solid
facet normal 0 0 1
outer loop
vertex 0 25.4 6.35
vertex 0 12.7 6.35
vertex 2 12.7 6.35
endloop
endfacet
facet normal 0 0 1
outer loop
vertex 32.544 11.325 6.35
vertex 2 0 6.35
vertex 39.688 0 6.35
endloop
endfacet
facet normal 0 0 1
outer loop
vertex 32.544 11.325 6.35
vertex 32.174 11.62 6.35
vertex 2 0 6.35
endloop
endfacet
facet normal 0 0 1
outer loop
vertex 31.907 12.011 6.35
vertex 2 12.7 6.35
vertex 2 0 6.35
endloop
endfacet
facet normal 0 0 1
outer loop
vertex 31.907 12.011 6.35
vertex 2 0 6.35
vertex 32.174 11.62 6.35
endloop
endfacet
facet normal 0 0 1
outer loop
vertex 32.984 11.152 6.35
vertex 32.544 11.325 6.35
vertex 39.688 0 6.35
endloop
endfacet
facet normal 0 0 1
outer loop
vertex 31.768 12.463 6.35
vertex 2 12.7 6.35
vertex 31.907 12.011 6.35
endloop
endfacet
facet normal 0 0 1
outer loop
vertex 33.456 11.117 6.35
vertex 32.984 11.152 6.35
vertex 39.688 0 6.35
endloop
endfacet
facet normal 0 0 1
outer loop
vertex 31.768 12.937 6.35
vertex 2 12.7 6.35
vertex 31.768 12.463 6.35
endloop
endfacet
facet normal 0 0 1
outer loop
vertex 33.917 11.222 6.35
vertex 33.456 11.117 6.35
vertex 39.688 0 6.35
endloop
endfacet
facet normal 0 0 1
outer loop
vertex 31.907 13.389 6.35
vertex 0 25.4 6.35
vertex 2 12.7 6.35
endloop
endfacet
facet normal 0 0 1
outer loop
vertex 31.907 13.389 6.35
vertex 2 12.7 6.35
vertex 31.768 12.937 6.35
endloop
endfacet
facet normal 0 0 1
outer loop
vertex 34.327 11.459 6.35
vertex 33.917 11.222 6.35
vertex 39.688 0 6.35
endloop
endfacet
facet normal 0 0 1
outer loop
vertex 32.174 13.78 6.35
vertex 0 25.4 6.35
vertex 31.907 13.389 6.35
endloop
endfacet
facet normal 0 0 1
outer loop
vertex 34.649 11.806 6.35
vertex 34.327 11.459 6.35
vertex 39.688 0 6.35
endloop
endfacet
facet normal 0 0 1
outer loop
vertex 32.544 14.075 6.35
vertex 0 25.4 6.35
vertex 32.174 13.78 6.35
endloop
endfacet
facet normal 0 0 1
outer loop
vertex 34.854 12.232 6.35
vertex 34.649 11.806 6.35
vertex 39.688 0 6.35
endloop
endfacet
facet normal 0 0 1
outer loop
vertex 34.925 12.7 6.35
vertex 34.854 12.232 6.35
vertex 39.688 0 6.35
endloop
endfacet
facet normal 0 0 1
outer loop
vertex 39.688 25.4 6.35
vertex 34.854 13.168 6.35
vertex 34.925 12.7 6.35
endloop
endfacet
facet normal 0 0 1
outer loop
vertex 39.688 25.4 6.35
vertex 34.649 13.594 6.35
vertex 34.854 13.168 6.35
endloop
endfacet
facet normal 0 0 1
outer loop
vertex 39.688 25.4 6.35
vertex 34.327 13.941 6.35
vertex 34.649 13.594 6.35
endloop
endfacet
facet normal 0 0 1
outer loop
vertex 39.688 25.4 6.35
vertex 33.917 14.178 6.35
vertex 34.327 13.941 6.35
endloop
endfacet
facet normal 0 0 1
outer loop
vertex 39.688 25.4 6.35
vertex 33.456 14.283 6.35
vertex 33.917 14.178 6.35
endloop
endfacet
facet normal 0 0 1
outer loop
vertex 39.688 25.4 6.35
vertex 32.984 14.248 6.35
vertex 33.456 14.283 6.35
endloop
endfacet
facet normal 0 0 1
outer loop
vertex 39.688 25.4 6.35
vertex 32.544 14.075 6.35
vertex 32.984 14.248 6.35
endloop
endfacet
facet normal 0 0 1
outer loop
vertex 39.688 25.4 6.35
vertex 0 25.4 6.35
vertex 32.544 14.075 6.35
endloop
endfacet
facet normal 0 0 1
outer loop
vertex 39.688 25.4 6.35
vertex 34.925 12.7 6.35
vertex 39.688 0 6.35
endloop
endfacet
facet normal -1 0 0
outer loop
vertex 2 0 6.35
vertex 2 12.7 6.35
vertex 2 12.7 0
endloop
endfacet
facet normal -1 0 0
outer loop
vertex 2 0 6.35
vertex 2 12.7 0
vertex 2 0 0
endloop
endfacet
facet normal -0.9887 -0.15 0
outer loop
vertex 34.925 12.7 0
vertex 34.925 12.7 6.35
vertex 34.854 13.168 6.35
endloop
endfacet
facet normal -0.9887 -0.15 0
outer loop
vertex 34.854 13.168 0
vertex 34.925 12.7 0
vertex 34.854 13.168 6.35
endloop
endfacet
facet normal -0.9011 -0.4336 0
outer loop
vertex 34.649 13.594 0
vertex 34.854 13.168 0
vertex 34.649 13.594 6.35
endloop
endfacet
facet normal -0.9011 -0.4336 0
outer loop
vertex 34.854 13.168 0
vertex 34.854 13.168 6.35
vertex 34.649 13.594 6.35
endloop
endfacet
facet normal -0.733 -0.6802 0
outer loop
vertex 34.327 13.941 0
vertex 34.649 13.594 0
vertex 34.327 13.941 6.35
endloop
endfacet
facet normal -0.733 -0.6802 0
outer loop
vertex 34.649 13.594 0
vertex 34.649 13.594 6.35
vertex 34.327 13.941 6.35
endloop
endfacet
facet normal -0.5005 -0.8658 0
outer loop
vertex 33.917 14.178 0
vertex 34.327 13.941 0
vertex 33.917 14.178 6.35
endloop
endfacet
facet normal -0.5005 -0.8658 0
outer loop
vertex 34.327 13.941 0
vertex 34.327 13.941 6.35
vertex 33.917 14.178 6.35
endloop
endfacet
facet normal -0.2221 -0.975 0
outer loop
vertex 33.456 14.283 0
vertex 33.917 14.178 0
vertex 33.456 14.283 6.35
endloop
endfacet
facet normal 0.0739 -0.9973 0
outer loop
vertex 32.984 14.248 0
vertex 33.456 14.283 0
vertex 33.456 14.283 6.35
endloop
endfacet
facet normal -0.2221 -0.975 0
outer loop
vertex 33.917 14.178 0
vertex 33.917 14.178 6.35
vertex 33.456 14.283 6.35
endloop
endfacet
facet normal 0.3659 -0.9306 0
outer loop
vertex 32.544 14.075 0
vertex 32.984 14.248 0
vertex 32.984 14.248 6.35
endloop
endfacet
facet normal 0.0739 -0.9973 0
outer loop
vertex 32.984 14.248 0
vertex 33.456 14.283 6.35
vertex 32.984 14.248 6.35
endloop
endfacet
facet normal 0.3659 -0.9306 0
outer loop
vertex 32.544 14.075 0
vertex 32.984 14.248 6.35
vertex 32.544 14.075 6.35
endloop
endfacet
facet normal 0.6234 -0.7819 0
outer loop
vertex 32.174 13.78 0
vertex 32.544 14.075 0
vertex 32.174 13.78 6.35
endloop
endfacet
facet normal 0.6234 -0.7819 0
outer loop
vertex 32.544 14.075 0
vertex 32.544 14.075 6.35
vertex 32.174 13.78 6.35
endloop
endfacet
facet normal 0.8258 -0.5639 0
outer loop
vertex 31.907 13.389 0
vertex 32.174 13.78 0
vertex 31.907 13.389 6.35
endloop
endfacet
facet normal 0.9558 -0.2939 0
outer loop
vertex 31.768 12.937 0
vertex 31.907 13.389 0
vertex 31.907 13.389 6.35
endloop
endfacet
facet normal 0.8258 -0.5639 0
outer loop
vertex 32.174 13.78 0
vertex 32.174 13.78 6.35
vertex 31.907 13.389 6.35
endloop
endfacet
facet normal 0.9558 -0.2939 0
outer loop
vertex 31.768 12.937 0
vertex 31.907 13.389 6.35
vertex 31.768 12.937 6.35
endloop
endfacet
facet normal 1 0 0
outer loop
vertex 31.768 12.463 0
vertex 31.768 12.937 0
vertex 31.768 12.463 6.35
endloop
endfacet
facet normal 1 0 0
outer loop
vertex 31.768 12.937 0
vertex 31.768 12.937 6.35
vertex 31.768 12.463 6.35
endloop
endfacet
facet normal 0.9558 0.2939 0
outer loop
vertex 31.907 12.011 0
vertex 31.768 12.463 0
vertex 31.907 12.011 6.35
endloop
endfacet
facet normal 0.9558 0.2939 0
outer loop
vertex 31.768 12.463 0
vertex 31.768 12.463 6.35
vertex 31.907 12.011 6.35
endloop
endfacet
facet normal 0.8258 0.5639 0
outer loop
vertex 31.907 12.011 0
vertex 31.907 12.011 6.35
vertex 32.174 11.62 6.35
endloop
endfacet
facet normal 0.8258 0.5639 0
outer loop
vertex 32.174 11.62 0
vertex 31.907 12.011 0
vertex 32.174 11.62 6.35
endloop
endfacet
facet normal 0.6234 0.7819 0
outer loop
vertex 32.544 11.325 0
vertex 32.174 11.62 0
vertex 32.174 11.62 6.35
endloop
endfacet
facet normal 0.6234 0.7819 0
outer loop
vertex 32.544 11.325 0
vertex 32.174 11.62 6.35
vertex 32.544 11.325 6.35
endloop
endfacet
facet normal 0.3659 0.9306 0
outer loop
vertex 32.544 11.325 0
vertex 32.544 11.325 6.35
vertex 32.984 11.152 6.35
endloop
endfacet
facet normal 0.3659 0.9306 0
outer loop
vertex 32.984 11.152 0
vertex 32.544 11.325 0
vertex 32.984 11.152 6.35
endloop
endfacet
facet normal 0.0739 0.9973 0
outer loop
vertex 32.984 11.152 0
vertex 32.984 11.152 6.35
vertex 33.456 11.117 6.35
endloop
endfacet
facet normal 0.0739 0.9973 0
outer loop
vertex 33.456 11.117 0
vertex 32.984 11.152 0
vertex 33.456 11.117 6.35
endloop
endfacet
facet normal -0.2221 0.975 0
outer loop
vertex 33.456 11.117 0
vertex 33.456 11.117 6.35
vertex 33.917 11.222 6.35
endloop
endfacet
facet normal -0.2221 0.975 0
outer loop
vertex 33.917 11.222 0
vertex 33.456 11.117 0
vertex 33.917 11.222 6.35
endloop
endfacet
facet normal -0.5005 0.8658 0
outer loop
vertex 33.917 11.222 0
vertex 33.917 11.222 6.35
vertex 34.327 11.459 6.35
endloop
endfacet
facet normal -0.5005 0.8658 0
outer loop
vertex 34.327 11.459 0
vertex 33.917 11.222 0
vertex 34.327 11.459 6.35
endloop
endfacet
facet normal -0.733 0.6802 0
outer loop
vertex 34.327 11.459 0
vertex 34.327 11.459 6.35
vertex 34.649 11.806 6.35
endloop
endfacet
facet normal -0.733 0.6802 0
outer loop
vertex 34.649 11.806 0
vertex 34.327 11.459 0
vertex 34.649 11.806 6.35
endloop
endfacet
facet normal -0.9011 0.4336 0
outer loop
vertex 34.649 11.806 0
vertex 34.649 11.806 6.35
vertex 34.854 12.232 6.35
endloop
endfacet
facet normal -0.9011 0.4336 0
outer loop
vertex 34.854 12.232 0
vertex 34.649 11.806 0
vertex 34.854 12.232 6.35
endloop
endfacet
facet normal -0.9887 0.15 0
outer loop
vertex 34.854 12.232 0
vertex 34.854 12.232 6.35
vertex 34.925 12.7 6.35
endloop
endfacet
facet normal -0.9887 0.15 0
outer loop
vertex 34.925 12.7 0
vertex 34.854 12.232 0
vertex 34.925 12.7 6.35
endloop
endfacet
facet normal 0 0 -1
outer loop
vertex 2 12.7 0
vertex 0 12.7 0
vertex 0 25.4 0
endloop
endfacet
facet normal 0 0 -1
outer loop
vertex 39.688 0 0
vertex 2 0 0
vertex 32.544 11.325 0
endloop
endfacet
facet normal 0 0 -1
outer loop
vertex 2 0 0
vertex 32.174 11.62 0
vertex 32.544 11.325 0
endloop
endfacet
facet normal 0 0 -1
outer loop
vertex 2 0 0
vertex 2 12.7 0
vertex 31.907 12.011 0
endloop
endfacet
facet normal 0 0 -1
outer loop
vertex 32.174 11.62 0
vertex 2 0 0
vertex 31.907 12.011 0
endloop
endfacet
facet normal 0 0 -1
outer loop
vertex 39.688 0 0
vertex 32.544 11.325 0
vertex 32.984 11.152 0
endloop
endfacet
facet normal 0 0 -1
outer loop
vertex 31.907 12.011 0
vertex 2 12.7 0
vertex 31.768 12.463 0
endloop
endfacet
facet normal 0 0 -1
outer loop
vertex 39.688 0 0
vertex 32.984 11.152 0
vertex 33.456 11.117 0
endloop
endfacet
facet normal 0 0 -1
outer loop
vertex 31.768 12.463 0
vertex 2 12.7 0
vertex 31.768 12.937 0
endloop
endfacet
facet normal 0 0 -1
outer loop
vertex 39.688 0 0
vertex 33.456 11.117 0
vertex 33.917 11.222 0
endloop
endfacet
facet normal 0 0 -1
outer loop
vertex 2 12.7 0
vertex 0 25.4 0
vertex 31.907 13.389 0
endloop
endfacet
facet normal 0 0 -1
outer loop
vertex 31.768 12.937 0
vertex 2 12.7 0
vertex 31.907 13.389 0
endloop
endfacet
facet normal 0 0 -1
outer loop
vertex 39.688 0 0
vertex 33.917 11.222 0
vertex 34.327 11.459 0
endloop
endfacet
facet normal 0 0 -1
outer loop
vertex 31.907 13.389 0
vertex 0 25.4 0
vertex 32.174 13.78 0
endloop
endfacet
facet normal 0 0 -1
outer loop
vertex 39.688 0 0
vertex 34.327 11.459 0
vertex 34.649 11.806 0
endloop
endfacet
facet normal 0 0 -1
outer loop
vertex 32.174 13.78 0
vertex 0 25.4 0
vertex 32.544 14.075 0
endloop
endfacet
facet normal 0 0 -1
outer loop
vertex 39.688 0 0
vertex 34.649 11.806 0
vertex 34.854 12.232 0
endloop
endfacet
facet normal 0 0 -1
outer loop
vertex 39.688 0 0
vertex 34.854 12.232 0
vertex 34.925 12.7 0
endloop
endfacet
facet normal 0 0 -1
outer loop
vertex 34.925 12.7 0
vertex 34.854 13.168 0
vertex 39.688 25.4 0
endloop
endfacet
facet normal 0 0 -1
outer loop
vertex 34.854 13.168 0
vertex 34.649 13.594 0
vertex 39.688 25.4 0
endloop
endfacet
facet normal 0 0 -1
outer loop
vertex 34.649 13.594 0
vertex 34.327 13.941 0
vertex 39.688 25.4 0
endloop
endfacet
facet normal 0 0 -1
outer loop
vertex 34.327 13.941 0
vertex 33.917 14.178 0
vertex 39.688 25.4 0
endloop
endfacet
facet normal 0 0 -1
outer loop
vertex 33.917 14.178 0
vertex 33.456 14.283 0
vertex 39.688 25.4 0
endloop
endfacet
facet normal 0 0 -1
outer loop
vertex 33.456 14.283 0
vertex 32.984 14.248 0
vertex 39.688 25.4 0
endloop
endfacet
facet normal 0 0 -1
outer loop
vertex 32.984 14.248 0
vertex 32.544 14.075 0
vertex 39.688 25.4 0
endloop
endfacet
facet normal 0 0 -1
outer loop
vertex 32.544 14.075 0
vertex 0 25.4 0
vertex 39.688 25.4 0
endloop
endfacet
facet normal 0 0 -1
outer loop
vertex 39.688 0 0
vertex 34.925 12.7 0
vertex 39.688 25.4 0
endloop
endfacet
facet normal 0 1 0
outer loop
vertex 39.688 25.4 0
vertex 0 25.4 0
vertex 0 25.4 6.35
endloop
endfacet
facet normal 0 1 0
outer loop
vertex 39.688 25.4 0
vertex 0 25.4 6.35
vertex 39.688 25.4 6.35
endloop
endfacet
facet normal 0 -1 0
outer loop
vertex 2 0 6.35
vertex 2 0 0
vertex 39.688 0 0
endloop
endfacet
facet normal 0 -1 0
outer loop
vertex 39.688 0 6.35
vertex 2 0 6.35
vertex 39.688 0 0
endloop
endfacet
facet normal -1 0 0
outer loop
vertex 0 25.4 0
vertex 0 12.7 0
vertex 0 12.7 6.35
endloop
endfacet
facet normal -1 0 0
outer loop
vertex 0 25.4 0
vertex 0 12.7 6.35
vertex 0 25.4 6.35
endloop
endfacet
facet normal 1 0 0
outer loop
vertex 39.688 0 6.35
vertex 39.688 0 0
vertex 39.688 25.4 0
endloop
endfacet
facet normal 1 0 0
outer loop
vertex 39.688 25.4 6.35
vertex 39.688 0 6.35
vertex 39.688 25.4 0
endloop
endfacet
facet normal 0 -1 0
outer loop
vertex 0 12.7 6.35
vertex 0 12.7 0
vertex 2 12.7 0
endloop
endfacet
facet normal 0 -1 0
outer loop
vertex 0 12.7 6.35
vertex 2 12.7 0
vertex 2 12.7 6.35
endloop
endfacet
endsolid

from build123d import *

# Parameters (mm, degrees)
F0_W     = 39.6875
F0_H     = 25.4
F1_DEPTH = 6.35
F2_W     = 12.7
F2_H     = 6.35
F3_DEPTH = 2
F4_R     = 1.5875
F5_DEPTH = 25.4


with BuildPart() as f1:
    # F0 (on Top) → F1 (new body)
    with BuildSketch(Plane.XY):
        with Locations((19.84375, 12.7)):
            Rectangle(F0_W, F0_H)
    extrude(amount=F1_DEPTH)

    # F2 (on face) → F3 (cut)
    with BuildSketch(Plane(origin=(0, 0, 0), x_dir=(0, -1, 0), z_dir=(-1, 0, 0))):
        with Locations((-6.35, 3.175)):
            Rectangle(F2_W, F2_H)
    extrude(amount=-F3_DEPTH, mode=Mode.SUBTRACT)

    # F4 (on face) → F5 (cut)
    with BuildSketch(Plane.XY.offset(6.35)):
        with Locations((33.3375, 12.7)):
            Circle(F4_R)
    extrude(amount=-F5_DEPTH, mode=Mode.SUBTRACT)


solid = f1.part
